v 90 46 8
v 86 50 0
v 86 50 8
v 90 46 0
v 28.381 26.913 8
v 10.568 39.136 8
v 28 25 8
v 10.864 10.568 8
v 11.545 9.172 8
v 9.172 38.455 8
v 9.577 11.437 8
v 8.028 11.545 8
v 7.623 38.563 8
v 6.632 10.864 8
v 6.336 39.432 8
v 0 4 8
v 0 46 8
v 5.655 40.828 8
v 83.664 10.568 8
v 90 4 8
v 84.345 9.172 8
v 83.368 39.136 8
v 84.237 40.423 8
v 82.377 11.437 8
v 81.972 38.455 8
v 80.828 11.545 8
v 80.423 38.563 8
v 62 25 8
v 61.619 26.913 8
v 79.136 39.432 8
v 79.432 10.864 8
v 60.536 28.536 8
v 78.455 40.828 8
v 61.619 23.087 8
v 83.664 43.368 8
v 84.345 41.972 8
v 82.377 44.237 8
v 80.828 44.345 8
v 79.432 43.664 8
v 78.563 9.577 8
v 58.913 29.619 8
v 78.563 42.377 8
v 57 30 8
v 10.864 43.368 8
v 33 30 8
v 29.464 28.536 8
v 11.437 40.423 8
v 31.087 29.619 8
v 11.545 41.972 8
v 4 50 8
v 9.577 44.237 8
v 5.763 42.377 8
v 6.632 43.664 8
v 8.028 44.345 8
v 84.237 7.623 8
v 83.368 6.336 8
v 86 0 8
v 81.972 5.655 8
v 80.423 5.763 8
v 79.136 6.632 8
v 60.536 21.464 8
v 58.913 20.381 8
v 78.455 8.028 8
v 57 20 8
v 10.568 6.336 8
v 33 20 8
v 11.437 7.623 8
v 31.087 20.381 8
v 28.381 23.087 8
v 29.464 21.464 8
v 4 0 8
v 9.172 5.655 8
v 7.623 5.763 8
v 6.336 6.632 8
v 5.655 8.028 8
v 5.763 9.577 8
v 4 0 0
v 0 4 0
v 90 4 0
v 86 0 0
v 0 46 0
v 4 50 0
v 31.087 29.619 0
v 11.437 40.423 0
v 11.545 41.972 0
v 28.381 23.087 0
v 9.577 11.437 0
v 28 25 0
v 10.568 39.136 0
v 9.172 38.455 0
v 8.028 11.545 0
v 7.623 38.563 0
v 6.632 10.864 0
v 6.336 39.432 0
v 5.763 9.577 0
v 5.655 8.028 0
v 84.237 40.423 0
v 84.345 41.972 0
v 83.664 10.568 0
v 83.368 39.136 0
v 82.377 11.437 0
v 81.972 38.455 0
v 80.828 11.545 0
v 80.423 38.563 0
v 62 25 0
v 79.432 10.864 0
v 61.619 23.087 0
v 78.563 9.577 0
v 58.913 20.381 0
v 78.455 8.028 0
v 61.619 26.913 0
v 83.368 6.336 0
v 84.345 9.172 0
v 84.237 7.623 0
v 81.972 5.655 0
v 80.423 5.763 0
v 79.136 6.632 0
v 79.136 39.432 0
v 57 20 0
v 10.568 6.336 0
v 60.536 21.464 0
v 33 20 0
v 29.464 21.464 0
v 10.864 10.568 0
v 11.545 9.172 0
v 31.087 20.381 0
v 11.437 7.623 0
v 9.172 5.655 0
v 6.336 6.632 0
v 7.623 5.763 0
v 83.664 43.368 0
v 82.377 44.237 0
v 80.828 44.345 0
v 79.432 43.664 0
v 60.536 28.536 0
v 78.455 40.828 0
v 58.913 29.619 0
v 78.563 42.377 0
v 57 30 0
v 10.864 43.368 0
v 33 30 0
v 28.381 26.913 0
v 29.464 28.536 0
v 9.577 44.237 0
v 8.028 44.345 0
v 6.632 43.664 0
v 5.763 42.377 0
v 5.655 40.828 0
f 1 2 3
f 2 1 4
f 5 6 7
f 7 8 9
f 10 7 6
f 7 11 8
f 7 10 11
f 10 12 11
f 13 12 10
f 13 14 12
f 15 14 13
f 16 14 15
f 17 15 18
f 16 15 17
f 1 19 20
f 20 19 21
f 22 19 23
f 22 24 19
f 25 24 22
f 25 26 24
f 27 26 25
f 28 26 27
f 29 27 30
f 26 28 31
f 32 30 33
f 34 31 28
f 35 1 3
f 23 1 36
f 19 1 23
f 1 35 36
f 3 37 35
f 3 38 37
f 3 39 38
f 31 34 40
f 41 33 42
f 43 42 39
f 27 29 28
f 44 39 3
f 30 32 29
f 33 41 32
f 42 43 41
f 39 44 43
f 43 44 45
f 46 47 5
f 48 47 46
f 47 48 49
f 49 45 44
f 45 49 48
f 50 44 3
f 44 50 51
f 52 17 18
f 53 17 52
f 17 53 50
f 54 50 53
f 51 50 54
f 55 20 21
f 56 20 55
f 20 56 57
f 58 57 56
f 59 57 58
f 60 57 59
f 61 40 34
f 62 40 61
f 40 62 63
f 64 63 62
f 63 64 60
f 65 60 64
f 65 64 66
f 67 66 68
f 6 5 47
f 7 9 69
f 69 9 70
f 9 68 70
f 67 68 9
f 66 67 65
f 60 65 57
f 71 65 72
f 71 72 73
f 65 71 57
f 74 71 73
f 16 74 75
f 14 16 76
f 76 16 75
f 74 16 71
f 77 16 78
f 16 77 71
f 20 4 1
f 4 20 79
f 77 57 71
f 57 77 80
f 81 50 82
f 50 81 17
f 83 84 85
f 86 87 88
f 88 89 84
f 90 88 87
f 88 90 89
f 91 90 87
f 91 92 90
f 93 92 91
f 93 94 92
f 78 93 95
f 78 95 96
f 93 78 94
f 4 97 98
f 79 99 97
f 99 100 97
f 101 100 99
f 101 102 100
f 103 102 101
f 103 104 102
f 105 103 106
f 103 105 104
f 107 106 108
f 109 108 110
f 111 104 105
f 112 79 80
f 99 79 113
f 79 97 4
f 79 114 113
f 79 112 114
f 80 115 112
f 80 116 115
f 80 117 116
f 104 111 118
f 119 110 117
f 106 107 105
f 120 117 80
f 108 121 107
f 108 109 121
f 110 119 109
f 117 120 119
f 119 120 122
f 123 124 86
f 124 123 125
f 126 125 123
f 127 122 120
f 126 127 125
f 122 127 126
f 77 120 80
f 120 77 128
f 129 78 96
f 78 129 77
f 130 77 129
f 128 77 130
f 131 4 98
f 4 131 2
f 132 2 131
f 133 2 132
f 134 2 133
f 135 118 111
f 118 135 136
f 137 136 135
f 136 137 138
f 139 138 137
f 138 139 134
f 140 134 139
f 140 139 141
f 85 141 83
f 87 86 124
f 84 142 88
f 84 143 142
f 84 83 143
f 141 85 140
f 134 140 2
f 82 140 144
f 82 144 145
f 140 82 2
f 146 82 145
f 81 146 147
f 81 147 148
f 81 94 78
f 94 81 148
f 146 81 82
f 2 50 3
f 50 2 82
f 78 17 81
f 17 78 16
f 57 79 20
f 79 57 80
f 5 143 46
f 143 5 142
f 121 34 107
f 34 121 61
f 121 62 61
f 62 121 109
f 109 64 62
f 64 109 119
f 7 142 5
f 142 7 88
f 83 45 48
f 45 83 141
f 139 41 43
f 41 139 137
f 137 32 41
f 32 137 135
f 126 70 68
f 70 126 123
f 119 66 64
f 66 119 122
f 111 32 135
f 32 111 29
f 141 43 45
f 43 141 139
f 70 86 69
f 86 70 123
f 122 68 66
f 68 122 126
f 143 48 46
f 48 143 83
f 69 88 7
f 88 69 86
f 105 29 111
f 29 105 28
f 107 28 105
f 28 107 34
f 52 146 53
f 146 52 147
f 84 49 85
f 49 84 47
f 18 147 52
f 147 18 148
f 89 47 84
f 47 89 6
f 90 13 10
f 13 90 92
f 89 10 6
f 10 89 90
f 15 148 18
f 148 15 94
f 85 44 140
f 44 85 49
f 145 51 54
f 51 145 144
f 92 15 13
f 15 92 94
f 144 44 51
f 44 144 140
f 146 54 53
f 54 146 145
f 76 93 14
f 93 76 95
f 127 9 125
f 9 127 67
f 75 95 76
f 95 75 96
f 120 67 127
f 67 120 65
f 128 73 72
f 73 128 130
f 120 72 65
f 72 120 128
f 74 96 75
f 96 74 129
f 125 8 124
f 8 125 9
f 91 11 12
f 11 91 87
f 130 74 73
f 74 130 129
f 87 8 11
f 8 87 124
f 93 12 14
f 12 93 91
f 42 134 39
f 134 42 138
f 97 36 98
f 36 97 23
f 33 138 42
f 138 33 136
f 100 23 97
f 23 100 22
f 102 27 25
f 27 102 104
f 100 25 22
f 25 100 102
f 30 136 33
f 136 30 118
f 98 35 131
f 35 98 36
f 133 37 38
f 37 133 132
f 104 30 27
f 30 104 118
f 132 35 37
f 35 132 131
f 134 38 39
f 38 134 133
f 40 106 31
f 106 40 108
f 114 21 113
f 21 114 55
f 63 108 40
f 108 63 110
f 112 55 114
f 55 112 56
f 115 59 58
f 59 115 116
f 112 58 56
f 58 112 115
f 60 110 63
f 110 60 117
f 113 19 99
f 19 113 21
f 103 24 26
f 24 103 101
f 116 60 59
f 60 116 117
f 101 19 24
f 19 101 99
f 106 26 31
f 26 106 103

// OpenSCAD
$fn = 32;

// ----------------------------------------------------------------------
// Bracket plate: slot plate 90 x 50
// ----------------------------------------------------------------------

// --- parameters (mm) ---
hole_r = 3;               // bolt hole radius
plate_t = 8;              // plate thickness, Z (extrusion height)
plate_l = 90;             // plate length
plate_w = 50;             // plate width
slot_l = 24;              // slot straight length
slot_r = 5;               // slot end radius

slot_len = slot_l + 2 * slot_r;
slot_w = 2 * slot_r;
hole_d2 = 2 * hole_r;

profile = [[4, 0], [86, 0], [90, 4], [90, 46], [86, 50], [4, 50], [0, 46], [0, 4]];  // primary outline, 8 points, counter clockwise
void_1 = [[57, 20], [58.913, 20.381], [60.536, 21.464], [61.619, 23.087], [62, 25], [61.619, 26.913], [60.536, 28.536], [58.913, 29.619], [57, 30], [33, 30], [31.087, 29.619], [29.464, 28.536], [28.381, 26.913], [28, 25], [28.381, 23.087], [29.464, 21.464], [31.087, 20.381], [33, 20]];  // grip slot, 18 points
void_2 = [[11.545, 41.972], [10.864, 43.368], [9.577, 44.237], [8.028, 44.345], [6.632, 43.664], [5.763, 42.377], [5.655, 40.828], [6.336, 39.432], [7.623, 38.563], [9.172, 38.455], [10.568, 39.136], [11.437, 40.423]];  // corner hole, 12 points
void_3 = [[11.545, 9.172], [10.864, 10.568], [9.577, 11.437], [8.028, 11.545], [6.632, 10.864], [5.763, 9.577], [5.655, 8.028], [6.336, 6.632], [7.623, 5.763], [9.172, 5.655], [10.568, 6.336], [11.437, 7.623]];  // corner hole, 12 points
void_4 = [[84.345, 41.972], [83.664, 43.368], [82.377, 44.237], [80.828, 44.345], [79.432, 43.664], [78.563, 42.377], [78.455, 40.828], [79.136, 39.432], [80.423, 38.563], [81.972, 38.455], [83.368, 39.136], [84.237, 40.423]];  // corner hole, 12 points
void_5 = [[84.345, 9.172], [83.664, 10.568], [82.377, 11.437], [80.828, 11.545], [79.432, 10.864], [78.563, 9.577], [78.455, 8.028], [79.136, 6.632], [80.423, 5.763], [81.972, 5.655], [83.368, 6.336], [84.237, 7.623]];  // corner hole, 12 points

// --- the one profile operation ---
difference() {
  linear_extrude(height = plate_t) polygon(points = profile);
  translate([0, 0, -1])
    linear_extrude(height = plate_t + 2) polygon(points = void_1);
  translate([0, 0, -1])
    linear_extrude(height = plate_t + 2) polygon(points = void_2);
  translate([0, 0, -1])
    linear_extrude(height = plate_t + 2) polygon(points = void_3);
  translate([0, 0, -1])
    linear_extrude(height = plate_t + 2) polygon(points = void_4);
  translate([0, 0, -1])
    linear_extrude(height = plate_t + 2) polygon(points = void_5);
}
